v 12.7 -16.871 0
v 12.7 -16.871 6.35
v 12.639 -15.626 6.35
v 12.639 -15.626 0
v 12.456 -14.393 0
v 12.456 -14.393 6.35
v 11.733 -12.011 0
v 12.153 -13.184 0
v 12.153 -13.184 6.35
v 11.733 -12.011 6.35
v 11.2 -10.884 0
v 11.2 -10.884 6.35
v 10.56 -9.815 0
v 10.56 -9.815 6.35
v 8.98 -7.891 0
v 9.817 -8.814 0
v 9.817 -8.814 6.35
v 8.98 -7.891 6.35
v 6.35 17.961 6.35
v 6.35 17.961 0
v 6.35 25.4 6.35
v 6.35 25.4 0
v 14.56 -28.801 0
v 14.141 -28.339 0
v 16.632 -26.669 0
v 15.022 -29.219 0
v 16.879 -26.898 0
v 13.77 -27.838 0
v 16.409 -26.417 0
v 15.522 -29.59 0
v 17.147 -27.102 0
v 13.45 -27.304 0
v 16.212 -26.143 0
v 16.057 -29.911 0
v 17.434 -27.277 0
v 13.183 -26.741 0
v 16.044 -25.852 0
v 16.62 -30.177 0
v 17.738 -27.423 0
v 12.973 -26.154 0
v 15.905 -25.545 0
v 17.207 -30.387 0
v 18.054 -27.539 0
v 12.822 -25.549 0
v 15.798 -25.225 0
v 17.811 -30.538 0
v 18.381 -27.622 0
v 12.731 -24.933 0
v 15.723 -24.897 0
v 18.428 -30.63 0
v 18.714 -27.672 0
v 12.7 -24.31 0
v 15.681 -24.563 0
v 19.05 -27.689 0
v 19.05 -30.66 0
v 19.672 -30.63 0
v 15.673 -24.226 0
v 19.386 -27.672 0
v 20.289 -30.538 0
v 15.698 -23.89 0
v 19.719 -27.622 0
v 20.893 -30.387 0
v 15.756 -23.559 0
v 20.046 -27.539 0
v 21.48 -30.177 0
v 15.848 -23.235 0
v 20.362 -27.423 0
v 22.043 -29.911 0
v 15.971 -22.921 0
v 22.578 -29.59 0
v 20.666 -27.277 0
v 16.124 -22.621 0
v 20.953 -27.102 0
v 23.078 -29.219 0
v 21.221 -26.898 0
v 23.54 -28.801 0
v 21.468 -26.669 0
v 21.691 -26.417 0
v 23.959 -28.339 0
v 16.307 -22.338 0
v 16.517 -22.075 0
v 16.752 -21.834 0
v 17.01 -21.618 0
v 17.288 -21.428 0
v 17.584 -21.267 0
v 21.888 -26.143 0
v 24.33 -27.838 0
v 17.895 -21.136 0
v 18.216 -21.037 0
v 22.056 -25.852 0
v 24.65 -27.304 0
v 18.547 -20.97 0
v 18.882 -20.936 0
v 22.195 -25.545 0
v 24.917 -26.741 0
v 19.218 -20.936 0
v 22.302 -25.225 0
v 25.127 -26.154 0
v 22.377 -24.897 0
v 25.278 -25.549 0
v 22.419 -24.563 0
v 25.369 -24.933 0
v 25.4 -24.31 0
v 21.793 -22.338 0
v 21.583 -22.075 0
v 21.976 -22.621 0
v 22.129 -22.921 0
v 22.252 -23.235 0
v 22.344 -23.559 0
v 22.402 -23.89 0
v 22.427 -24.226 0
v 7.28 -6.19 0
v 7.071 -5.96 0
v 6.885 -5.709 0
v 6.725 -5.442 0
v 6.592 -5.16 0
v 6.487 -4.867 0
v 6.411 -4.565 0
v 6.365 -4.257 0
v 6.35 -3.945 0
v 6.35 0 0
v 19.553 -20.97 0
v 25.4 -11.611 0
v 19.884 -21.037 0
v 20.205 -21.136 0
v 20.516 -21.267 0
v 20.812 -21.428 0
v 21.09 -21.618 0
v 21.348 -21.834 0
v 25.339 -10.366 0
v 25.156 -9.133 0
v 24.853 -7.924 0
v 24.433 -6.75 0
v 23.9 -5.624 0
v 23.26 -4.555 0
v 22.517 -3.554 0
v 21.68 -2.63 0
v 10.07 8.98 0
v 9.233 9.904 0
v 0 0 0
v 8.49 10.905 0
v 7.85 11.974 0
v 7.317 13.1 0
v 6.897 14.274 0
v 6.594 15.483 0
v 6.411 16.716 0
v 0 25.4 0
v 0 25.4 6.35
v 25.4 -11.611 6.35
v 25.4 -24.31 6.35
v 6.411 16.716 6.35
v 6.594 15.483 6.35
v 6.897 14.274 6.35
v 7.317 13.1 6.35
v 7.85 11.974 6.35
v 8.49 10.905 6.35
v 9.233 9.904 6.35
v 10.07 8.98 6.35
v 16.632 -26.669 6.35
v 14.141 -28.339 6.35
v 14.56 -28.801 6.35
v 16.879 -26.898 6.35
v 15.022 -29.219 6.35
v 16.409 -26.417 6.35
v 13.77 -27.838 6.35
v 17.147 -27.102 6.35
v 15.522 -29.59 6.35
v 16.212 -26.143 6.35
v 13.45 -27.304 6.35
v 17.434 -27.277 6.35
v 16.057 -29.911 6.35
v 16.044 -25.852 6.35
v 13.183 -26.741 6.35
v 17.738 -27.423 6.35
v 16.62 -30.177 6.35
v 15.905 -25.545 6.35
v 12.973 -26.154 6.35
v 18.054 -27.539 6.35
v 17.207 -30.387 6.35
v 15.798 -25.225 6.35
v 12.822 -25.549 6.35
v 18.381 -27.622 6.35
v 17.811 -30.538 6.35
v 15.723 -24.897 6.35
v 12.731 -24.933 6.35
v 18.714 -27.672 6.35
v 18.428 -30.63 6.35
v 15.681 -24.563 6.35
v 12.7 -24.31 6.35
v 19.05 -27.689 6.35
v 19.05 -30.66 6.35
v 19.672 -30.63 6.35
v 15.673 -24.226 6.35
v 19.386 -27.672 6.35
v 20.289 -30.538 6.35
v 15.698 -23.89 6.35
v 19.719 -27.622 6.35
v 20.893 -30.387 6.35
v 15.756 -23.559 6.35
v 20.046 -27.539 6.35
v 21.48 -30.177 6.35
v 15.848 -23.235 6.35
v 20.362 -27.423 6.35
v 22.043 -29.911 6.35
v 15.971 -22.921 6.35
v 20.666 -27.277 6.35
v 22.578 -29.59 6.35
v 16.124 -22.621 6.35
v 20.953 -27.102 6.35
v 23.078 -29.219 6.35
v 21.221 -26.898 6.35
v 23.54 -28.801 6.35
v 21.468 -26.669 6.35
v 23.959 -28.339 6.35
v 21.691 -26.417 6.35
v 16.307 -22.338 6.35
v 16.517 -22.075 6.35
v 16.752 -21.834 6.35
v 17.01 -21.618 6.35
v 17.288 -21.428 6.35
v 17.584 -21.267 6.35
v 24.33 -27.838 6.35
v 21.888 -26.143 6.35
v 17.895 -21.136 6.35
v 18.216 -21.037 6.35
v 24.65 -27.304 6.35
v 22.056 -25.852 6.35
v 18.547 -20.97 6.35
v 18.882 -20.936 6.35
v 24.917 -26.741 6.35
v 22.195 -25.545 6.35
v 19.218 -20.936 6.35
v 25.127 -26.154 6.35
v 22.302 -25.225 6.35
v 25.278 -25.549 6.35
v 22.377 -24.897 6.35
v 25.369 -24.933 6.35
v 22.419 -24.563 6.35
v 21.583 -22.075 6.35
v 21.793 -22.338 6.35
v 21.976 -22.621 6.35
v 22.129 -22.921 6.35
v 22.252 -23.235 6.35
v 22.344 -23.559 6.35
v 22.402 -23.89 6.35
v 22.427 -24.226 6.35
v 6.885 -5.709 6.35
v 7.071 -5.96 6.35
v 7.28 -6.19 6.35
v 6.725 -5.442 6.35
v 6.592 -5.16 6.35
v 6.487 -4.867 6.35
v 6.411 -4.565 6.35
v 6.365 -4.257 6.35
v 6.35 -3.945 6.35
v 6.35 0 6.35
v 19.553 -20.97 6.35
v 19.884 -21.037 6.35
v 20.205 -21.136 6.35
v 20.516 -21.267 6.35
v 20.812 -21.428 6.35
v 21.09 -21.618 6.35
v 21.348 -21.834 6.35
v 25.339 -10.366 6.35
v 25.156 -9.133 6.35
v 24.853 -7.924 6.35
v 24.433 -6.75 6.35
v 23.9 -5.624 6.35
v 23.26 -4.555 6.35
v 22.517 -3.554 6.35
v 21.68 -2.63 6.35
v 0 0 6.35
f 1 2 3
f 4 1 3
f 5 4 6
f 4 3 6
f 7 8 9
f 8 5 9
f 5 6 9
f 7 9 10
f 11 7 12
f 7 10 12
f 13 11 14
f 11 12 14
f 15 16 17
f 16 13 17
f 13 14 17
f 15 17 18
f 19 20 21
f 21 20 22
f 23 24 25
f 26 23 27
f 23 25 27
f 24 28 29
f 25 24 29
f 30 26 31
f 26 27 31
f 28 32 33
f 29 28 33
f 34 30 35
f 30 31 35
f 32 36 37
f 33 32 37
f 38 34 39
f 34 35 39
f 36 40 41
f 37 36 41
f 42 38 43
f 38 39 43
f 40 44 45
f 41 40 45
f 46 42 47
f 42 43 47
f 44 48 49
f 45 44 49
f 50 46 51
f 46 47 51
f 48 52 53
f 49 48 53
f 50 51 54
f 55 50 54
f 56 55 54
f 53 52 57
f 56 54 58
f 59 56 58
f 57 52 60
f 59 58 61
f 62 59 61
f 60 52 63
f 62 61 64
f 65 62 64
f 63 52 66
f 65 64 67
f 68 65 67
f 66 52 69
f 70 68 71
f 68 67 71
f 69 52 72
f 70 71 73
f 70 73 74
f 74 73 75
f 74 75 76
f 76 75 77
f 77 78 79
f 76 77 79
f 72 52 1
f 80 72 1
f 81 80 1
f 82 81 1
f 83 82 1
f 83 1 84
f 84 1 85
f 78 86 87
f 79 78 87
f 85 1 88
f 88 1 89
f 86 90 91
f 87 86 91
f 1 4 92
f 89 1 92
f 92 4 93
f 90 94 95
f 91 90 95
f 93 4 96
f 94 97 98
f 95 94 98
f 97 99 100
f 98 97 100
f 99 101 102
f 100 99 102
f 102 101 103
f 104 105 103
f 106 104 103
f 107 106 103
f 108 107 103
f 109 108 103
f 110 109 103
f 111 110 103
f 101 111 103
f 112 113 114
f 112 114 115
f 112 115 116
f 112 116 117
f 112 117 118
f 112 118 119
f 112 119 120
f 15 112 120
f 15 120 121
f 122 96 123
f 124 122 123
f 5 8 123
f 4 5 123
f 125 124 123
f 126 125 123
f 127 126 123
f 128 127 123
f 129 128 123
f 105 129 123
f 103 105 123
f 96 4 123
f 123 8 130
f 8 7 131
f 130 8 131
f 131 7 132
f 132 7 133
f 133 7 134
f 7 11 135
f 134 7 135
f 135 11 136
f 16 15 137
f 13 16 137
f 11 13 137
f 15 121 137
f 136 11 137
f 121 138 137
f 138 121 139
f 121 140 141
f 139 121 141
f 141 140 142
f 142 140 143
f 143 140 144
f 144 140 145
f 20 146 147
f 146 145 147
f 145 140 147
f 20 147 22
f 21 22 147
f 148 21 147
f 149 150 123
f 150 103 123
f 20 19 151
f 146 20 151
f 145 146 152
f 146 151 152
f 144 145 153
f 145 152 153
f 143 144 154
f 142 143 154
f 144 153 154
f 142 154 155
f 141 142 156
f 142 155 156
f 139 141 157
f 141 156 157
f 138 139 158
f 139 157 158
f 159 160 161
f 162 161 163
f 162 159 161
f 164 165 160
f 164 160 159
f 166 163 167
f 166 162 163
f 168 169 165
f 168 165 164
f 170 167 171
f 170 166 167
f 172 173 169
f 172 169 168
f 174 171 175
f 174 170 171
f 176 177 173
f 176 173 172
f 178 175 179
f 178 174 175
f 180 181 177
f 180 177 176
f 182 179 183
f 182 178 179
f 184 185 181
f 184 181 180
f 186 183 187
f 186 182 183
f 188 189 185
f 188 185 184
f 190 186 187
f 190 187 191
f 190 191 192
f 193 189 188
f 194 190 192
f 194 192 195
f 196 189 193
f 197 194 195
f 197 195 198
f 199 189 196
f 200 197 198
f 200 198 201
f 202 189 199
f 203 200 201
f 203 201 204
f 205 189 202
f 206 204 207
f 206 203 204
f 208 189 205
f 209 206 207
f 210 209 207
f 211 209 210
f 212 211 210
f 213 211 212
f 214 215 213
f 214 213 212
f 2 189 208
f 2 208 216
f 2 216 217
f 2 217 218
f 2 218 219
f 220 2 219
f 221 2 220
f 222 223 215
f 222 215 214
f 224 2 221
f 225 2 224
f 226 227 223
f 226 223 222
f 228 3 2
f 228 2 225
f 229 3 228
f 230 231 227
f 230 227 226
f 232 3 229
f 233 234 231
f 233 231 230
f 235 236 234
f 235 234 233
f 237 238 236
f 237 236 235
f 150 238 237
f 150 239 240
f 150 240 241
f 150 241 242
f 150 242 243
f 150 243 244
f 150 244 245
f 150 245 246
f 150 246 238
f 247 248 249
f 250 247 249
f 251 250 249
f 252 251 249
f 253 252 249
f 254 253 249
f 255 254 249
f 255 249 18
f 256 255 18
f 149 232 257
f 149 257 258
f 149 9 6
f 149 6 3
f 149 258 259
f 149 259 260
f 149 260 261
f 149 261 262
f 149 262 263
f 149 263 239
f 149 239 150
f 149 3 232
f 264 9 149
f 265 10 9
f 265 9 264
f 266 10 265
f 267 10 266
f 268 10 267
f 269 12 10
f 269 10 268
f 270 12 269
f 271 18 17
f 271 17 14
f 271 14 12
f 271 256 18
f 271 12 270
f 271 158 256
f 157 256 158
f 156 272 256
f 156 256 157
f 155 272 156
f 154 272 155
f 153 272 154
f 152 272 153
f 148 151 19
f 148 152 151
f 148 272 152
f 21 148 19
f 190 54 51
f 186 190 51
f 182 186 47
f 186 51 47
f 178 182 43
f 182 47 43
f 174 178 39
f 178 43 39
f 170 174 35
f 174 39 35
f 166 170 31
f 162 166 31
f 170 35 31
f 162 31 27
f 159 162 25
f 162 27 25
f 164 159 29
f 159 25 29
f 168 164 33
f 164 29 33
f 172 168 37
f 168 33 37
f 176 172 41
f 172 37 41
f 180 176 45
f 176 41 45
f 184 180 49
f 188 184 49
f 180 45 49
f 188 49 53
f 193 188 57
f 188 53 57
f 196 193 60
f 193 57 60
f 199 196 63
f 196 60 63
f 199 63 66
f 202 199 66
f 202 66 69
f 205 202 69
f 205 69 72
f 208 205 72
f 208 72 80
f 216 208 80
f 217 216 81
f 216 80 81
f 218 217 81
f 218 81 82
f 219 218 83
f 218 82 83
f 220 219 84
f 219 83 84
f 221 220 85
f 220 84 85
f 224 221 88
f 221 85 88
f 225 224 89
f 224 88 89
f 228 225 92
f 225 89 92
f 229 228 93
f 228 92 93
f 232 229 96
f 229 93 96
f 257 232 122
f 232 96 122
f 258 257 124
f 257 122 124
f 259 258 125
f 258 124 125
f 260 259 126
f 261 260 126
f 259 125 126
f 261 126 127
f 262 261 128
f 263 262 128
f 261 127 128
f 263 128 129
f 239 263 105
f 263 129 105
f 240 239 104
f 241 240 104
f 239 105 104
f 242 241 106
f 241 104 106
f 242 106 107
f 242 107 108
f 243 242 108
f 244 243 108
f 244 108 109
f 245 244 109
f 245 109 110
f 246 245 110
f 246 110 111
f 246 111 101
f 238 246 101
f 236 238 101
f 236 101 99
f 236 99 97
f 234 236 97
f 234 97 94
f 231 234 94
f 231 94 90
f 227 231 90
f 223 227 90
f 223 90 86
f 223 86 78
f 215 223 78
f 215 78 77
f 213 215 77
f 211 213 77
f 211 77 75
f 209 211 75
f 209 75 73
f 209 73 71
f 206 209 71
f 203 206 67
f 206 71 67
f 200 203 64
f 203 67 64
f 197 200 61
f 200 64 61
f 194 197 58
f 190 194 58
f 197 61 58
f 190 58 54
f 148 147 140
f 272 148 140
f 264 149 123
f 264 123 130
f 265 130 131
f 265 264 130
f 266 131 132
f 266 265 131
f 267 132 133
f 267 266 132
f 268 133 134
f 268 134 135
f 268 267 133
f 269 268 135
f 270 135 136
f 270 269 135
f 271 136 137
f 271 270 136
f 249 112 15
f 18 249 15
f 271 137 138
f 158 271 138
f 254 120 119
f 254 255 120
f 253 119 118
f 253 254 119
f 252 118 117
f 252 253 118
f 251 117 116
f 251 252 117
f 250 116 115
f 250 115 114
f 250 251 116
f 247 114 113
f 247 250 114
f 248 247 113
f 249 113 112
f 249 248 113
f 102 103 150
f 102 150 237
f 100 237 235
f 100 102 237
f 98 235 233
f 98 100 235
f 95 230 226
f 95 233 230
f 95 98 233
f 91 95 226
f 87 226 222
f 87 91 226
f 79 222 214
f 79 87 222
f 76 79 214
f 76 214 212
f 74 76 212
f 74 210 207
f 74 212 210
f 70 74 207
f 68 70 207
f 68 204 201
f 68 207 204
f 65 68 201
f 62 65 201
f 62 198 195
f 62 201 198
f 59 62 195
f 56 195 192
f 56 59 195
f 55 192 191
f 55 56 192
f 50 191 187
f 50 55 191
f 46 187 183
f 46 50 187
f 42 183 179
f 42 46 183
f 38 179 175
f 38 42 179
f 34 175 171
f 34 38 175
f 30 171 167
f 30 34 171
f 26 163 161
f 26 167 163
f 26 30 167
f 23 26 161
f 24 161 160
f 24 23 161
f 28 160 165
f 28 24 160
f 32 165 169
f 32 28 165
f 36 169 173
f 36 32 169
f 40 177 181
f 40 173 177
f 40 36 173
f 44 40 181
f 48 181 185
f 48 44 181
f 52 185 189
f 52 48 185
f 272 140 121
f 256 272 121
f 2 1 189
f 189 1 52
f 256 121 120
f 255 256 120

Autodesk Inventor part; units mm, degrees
ref_plane "YZ Plane" through (0, 0, 0) normal (1, 0, 0) x (0, 1, 0)
ref_plane "XZ Plane" through (0, 0, 0) normal (0, 1, 0) x (-1, 0, 0)
ref_plane "XY Plane" through (0, 0, 0) normal (0, 0, 1) x (1, 0, 0)
sketch "Sketch1" plane through (0, 0, 0) normal (0, 0, 1) x (1, 0, 0)
  line L0 (0, 0) -> (6.35, 0)
  line L1 (6.35, 0) -> (6.35, 25.4)
  line L2 (6.35, 25.4) -> (0, 25.4)
  line L3 (0, 25.4) -> (0, 0)
  line L4 (6.35, 0) -> (6.35, -5.2605)
  line L5 (6.35, -5.2605) -> (12.7, -11.6105)
  line L6 (12.7, -11.6105) -> (12.7, -24.3105)
  arc A0 (12.7, -24.3105) -> (25.4, -24.3105) centre (19.05, -24.3105) ccw
  line L7 (25.4, -24.3105) -> (25.4, -6.35)
  line L8 (25.4, -6.35) -> (6.35, 12.7)
  dimension "d0" = 6.35
  dimension "d1" = 25.4
  dimension "d2" = 6.35
  dimension "d3" = 12.7
  dimension "d4" = 12.7
  dimension "d5" = 45
extrude "Extrusion1" add sketch "Sketch1" along normal blind 6.35
fillet "Fillet1" radius 3.175 1 edges at (6.35, -5.2605, 3.175)
fillet "Fillet2" radius 12.7 3 edges at (12.7, -11.6105, 3.175) (25.4, -6.35, 3.175) (6.35, 12.7, 3.175)
sketch "Sketch2" plane through (0, 0, 6.35) normal (0, 0, 1) x (1, 0, 0)
  arc A0 (12.7, -24.3105) -> (25.4, -24.3105) centre (19.05, -24.3105) ccw projected
hole "Hole1" at (19.05, -24.3105, 6.35) direction (0, 0, -1) diameter 6.7564 end through all clearance for "Socket Head Cap Screw" size "1/4" standard "Ansi Unified Screw Threads"
ref_plane "Work Plane1" through (11.7701, -1.7003, 6.35) normal (-0.7071, -0.7071, 0) x (-0.7071, 0.7071, 0)
properties part number "Mirror"
